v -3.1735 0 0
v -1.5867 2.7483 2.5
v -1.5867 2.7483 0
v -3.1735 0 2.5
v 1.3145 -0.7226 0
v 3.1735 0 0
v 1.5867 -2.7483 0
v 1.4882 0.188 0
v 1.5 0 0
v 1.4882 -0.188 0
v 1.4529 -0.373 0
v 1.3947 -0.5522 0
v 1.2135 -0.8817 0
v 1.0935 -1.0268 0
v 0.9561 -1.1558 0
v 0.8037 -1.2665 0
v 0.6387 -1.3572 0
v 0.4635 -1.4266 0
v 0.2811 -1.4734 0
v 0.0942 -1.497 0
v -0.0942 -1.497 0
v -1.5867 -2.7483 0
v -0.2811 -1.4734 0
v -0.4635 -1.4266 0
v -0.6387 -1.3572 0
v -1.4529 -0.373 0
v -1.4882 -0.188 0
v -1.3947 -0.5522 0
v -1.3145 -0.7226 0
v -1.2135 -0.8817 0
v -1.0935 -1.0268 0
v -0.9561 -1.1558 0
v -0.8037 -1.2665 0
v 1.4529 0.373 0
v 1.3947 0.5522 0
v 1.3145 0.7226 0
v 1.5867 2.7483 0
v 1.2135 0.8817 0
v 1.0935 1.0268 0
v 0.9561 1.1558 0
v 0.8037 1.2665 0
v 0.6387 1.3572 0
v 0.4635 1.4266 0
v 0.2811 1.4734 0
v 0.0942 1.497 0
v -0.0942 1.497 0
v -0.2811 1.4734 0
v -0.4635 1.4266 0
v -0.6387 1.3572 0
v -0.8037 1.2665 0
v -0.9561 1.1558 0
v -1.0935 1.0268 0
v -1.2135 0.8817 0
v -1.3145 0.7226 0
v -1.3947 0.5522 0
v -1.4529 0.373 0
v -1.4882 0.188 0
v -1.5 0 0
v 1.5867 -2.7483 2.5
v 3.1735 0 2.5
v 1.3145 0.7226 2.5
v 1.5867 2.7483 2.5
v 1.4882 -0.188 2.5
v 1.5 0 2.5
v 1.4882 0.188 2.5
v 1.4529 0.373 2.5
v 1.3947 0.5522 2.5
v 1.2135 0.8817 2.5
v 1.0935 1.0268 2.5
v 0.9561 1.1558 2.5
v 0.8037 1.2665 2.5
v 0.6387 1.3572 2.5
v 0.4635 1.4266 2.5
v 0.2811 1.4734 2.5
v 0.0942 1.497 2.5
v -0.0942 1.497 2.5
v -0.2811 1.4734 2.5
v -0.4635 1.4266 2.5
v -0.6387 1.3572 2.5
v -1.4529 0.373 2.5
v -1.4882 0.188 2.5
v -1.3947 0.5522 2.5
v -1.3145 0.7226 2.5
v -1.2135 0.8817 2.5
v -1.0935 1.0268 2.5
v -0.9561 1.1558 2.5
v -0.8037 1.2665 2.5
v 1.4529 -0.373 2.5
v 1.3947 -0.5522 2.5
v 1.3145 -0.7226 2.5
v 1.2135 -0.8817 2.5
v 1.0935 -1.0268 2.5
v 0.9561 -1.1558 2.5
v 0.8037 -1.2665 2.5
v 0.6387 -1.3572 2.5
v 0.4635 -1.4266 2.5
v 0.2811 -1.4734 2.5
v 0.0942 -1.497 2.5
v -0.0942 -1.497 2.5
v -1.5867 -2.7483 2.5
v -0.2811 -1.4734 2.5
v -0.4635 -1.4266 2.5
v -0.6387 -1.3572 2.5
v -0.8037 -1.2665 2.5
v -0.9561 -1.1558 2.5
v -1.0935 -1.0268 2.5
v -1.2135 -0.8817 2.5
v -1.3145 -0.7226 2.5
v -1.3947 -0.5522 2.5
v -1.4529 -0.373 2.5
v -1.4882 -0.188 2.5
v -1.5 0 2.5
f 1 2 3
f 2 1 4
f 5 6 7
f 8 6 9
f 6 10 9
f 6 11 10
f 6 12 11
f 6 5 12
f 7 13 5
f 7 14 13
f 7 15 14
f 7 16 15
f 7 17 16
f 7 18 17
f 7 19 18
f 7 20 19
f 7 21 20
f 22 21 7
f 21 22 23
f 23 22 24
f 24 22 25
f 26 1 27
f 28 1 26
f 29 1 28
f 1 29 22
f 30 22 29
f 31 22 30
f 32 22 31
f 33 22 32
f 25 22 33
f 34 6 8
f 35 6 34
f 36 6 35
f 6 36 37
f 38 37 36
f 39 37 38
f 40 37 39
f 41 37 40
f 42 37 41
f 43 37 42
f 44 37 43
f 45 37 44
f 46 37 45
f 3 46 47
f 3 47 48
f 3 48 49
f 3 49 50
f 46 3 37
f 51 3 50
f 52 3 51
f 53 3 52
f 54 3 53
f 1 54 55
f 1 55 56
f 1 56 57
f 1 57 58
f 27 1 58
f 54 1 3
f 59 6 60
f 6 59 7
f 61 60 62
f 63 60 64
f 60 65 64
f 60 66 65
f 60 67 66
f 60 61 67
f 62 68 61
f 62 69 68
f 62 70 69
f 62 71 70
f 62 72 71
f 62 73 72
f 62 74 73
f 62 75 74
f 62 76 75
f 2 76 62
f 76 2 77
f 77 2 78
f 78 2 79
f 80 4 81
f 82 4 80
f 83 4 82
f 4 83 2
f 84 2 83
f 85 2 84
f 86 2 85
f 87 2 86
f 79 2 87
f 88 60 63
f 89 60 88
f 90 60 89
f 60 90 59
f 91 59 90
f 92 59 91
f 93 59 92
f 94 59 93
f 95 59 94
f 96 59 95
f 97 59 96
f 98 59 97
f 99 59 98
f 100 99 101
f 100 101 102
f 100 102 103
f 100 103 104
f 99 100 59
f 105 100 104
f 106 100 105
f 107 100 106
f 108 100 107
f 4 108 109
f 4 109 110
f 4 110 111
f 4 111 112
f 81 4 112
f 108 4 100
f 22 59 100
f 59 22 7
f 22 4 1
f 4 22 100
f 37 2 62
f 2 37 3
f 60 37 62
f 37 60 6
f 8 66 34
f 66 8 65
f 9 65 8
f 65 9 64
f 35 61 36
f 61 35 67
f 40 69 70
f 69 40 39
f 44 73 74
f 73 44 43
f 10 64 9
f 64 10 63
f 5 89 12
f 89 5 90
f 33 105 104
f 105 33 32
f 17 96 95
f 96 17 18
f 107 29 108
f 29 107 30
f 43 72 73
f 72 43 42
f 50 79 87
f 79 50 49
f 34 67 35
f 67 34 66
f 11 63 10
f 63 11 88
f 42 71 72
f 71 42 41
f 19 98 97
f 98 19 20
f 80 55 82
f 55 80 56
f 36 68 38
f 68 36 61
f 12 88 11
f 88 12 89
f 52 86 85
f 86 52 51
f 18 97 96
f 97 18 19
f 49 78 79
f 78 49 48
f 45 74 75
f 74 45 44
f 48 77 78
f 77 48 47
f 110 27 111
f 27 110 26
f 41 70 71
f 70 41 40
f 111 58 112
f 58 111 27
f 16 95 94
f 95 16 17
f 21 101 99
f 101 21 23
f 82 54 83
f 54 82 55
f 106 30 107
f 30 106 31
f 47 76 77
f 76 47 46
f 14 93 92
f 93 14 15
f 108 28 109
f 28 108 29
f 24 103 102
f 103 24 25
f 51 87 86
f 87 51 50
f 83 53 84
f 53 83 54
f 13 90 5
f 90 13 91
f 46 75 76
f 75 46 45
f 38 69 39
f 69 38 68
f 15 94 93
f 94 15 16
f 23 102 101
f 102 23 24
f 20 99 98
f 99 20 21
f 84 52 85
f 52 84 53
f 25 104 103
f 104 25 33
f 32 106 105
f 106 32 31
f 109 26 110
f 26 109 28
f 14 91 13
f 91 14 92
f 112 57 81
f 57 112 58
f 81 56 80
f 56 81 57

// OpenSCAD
$fn = 50;

difference() {
	union() {
		translate(v = [0, 0, 0]) {
			rotate(a = [0, 0, 0]) {
				difference() {
					union() {
						linear_extrude(height = 2.5) {
							polygon(points = [[3.1734999999999998, 0.0], [1.5867500000000003, 2.7483316189099156], [-1.5867499999999992, 2.748331618909916], [-3.1734999999999998, 3.886416617094125e-16], [-1.5867500000000012, -2.748331618909915], [1.5867499999999977, -2.748331618909917]]);
						}
					}
					union();
				}
			}
		}
	}
	union() {
		translate(v = [0, 0, -0.1]) {
			cylinder(h = 2.7, r = 1.5);
		}
	}
}
